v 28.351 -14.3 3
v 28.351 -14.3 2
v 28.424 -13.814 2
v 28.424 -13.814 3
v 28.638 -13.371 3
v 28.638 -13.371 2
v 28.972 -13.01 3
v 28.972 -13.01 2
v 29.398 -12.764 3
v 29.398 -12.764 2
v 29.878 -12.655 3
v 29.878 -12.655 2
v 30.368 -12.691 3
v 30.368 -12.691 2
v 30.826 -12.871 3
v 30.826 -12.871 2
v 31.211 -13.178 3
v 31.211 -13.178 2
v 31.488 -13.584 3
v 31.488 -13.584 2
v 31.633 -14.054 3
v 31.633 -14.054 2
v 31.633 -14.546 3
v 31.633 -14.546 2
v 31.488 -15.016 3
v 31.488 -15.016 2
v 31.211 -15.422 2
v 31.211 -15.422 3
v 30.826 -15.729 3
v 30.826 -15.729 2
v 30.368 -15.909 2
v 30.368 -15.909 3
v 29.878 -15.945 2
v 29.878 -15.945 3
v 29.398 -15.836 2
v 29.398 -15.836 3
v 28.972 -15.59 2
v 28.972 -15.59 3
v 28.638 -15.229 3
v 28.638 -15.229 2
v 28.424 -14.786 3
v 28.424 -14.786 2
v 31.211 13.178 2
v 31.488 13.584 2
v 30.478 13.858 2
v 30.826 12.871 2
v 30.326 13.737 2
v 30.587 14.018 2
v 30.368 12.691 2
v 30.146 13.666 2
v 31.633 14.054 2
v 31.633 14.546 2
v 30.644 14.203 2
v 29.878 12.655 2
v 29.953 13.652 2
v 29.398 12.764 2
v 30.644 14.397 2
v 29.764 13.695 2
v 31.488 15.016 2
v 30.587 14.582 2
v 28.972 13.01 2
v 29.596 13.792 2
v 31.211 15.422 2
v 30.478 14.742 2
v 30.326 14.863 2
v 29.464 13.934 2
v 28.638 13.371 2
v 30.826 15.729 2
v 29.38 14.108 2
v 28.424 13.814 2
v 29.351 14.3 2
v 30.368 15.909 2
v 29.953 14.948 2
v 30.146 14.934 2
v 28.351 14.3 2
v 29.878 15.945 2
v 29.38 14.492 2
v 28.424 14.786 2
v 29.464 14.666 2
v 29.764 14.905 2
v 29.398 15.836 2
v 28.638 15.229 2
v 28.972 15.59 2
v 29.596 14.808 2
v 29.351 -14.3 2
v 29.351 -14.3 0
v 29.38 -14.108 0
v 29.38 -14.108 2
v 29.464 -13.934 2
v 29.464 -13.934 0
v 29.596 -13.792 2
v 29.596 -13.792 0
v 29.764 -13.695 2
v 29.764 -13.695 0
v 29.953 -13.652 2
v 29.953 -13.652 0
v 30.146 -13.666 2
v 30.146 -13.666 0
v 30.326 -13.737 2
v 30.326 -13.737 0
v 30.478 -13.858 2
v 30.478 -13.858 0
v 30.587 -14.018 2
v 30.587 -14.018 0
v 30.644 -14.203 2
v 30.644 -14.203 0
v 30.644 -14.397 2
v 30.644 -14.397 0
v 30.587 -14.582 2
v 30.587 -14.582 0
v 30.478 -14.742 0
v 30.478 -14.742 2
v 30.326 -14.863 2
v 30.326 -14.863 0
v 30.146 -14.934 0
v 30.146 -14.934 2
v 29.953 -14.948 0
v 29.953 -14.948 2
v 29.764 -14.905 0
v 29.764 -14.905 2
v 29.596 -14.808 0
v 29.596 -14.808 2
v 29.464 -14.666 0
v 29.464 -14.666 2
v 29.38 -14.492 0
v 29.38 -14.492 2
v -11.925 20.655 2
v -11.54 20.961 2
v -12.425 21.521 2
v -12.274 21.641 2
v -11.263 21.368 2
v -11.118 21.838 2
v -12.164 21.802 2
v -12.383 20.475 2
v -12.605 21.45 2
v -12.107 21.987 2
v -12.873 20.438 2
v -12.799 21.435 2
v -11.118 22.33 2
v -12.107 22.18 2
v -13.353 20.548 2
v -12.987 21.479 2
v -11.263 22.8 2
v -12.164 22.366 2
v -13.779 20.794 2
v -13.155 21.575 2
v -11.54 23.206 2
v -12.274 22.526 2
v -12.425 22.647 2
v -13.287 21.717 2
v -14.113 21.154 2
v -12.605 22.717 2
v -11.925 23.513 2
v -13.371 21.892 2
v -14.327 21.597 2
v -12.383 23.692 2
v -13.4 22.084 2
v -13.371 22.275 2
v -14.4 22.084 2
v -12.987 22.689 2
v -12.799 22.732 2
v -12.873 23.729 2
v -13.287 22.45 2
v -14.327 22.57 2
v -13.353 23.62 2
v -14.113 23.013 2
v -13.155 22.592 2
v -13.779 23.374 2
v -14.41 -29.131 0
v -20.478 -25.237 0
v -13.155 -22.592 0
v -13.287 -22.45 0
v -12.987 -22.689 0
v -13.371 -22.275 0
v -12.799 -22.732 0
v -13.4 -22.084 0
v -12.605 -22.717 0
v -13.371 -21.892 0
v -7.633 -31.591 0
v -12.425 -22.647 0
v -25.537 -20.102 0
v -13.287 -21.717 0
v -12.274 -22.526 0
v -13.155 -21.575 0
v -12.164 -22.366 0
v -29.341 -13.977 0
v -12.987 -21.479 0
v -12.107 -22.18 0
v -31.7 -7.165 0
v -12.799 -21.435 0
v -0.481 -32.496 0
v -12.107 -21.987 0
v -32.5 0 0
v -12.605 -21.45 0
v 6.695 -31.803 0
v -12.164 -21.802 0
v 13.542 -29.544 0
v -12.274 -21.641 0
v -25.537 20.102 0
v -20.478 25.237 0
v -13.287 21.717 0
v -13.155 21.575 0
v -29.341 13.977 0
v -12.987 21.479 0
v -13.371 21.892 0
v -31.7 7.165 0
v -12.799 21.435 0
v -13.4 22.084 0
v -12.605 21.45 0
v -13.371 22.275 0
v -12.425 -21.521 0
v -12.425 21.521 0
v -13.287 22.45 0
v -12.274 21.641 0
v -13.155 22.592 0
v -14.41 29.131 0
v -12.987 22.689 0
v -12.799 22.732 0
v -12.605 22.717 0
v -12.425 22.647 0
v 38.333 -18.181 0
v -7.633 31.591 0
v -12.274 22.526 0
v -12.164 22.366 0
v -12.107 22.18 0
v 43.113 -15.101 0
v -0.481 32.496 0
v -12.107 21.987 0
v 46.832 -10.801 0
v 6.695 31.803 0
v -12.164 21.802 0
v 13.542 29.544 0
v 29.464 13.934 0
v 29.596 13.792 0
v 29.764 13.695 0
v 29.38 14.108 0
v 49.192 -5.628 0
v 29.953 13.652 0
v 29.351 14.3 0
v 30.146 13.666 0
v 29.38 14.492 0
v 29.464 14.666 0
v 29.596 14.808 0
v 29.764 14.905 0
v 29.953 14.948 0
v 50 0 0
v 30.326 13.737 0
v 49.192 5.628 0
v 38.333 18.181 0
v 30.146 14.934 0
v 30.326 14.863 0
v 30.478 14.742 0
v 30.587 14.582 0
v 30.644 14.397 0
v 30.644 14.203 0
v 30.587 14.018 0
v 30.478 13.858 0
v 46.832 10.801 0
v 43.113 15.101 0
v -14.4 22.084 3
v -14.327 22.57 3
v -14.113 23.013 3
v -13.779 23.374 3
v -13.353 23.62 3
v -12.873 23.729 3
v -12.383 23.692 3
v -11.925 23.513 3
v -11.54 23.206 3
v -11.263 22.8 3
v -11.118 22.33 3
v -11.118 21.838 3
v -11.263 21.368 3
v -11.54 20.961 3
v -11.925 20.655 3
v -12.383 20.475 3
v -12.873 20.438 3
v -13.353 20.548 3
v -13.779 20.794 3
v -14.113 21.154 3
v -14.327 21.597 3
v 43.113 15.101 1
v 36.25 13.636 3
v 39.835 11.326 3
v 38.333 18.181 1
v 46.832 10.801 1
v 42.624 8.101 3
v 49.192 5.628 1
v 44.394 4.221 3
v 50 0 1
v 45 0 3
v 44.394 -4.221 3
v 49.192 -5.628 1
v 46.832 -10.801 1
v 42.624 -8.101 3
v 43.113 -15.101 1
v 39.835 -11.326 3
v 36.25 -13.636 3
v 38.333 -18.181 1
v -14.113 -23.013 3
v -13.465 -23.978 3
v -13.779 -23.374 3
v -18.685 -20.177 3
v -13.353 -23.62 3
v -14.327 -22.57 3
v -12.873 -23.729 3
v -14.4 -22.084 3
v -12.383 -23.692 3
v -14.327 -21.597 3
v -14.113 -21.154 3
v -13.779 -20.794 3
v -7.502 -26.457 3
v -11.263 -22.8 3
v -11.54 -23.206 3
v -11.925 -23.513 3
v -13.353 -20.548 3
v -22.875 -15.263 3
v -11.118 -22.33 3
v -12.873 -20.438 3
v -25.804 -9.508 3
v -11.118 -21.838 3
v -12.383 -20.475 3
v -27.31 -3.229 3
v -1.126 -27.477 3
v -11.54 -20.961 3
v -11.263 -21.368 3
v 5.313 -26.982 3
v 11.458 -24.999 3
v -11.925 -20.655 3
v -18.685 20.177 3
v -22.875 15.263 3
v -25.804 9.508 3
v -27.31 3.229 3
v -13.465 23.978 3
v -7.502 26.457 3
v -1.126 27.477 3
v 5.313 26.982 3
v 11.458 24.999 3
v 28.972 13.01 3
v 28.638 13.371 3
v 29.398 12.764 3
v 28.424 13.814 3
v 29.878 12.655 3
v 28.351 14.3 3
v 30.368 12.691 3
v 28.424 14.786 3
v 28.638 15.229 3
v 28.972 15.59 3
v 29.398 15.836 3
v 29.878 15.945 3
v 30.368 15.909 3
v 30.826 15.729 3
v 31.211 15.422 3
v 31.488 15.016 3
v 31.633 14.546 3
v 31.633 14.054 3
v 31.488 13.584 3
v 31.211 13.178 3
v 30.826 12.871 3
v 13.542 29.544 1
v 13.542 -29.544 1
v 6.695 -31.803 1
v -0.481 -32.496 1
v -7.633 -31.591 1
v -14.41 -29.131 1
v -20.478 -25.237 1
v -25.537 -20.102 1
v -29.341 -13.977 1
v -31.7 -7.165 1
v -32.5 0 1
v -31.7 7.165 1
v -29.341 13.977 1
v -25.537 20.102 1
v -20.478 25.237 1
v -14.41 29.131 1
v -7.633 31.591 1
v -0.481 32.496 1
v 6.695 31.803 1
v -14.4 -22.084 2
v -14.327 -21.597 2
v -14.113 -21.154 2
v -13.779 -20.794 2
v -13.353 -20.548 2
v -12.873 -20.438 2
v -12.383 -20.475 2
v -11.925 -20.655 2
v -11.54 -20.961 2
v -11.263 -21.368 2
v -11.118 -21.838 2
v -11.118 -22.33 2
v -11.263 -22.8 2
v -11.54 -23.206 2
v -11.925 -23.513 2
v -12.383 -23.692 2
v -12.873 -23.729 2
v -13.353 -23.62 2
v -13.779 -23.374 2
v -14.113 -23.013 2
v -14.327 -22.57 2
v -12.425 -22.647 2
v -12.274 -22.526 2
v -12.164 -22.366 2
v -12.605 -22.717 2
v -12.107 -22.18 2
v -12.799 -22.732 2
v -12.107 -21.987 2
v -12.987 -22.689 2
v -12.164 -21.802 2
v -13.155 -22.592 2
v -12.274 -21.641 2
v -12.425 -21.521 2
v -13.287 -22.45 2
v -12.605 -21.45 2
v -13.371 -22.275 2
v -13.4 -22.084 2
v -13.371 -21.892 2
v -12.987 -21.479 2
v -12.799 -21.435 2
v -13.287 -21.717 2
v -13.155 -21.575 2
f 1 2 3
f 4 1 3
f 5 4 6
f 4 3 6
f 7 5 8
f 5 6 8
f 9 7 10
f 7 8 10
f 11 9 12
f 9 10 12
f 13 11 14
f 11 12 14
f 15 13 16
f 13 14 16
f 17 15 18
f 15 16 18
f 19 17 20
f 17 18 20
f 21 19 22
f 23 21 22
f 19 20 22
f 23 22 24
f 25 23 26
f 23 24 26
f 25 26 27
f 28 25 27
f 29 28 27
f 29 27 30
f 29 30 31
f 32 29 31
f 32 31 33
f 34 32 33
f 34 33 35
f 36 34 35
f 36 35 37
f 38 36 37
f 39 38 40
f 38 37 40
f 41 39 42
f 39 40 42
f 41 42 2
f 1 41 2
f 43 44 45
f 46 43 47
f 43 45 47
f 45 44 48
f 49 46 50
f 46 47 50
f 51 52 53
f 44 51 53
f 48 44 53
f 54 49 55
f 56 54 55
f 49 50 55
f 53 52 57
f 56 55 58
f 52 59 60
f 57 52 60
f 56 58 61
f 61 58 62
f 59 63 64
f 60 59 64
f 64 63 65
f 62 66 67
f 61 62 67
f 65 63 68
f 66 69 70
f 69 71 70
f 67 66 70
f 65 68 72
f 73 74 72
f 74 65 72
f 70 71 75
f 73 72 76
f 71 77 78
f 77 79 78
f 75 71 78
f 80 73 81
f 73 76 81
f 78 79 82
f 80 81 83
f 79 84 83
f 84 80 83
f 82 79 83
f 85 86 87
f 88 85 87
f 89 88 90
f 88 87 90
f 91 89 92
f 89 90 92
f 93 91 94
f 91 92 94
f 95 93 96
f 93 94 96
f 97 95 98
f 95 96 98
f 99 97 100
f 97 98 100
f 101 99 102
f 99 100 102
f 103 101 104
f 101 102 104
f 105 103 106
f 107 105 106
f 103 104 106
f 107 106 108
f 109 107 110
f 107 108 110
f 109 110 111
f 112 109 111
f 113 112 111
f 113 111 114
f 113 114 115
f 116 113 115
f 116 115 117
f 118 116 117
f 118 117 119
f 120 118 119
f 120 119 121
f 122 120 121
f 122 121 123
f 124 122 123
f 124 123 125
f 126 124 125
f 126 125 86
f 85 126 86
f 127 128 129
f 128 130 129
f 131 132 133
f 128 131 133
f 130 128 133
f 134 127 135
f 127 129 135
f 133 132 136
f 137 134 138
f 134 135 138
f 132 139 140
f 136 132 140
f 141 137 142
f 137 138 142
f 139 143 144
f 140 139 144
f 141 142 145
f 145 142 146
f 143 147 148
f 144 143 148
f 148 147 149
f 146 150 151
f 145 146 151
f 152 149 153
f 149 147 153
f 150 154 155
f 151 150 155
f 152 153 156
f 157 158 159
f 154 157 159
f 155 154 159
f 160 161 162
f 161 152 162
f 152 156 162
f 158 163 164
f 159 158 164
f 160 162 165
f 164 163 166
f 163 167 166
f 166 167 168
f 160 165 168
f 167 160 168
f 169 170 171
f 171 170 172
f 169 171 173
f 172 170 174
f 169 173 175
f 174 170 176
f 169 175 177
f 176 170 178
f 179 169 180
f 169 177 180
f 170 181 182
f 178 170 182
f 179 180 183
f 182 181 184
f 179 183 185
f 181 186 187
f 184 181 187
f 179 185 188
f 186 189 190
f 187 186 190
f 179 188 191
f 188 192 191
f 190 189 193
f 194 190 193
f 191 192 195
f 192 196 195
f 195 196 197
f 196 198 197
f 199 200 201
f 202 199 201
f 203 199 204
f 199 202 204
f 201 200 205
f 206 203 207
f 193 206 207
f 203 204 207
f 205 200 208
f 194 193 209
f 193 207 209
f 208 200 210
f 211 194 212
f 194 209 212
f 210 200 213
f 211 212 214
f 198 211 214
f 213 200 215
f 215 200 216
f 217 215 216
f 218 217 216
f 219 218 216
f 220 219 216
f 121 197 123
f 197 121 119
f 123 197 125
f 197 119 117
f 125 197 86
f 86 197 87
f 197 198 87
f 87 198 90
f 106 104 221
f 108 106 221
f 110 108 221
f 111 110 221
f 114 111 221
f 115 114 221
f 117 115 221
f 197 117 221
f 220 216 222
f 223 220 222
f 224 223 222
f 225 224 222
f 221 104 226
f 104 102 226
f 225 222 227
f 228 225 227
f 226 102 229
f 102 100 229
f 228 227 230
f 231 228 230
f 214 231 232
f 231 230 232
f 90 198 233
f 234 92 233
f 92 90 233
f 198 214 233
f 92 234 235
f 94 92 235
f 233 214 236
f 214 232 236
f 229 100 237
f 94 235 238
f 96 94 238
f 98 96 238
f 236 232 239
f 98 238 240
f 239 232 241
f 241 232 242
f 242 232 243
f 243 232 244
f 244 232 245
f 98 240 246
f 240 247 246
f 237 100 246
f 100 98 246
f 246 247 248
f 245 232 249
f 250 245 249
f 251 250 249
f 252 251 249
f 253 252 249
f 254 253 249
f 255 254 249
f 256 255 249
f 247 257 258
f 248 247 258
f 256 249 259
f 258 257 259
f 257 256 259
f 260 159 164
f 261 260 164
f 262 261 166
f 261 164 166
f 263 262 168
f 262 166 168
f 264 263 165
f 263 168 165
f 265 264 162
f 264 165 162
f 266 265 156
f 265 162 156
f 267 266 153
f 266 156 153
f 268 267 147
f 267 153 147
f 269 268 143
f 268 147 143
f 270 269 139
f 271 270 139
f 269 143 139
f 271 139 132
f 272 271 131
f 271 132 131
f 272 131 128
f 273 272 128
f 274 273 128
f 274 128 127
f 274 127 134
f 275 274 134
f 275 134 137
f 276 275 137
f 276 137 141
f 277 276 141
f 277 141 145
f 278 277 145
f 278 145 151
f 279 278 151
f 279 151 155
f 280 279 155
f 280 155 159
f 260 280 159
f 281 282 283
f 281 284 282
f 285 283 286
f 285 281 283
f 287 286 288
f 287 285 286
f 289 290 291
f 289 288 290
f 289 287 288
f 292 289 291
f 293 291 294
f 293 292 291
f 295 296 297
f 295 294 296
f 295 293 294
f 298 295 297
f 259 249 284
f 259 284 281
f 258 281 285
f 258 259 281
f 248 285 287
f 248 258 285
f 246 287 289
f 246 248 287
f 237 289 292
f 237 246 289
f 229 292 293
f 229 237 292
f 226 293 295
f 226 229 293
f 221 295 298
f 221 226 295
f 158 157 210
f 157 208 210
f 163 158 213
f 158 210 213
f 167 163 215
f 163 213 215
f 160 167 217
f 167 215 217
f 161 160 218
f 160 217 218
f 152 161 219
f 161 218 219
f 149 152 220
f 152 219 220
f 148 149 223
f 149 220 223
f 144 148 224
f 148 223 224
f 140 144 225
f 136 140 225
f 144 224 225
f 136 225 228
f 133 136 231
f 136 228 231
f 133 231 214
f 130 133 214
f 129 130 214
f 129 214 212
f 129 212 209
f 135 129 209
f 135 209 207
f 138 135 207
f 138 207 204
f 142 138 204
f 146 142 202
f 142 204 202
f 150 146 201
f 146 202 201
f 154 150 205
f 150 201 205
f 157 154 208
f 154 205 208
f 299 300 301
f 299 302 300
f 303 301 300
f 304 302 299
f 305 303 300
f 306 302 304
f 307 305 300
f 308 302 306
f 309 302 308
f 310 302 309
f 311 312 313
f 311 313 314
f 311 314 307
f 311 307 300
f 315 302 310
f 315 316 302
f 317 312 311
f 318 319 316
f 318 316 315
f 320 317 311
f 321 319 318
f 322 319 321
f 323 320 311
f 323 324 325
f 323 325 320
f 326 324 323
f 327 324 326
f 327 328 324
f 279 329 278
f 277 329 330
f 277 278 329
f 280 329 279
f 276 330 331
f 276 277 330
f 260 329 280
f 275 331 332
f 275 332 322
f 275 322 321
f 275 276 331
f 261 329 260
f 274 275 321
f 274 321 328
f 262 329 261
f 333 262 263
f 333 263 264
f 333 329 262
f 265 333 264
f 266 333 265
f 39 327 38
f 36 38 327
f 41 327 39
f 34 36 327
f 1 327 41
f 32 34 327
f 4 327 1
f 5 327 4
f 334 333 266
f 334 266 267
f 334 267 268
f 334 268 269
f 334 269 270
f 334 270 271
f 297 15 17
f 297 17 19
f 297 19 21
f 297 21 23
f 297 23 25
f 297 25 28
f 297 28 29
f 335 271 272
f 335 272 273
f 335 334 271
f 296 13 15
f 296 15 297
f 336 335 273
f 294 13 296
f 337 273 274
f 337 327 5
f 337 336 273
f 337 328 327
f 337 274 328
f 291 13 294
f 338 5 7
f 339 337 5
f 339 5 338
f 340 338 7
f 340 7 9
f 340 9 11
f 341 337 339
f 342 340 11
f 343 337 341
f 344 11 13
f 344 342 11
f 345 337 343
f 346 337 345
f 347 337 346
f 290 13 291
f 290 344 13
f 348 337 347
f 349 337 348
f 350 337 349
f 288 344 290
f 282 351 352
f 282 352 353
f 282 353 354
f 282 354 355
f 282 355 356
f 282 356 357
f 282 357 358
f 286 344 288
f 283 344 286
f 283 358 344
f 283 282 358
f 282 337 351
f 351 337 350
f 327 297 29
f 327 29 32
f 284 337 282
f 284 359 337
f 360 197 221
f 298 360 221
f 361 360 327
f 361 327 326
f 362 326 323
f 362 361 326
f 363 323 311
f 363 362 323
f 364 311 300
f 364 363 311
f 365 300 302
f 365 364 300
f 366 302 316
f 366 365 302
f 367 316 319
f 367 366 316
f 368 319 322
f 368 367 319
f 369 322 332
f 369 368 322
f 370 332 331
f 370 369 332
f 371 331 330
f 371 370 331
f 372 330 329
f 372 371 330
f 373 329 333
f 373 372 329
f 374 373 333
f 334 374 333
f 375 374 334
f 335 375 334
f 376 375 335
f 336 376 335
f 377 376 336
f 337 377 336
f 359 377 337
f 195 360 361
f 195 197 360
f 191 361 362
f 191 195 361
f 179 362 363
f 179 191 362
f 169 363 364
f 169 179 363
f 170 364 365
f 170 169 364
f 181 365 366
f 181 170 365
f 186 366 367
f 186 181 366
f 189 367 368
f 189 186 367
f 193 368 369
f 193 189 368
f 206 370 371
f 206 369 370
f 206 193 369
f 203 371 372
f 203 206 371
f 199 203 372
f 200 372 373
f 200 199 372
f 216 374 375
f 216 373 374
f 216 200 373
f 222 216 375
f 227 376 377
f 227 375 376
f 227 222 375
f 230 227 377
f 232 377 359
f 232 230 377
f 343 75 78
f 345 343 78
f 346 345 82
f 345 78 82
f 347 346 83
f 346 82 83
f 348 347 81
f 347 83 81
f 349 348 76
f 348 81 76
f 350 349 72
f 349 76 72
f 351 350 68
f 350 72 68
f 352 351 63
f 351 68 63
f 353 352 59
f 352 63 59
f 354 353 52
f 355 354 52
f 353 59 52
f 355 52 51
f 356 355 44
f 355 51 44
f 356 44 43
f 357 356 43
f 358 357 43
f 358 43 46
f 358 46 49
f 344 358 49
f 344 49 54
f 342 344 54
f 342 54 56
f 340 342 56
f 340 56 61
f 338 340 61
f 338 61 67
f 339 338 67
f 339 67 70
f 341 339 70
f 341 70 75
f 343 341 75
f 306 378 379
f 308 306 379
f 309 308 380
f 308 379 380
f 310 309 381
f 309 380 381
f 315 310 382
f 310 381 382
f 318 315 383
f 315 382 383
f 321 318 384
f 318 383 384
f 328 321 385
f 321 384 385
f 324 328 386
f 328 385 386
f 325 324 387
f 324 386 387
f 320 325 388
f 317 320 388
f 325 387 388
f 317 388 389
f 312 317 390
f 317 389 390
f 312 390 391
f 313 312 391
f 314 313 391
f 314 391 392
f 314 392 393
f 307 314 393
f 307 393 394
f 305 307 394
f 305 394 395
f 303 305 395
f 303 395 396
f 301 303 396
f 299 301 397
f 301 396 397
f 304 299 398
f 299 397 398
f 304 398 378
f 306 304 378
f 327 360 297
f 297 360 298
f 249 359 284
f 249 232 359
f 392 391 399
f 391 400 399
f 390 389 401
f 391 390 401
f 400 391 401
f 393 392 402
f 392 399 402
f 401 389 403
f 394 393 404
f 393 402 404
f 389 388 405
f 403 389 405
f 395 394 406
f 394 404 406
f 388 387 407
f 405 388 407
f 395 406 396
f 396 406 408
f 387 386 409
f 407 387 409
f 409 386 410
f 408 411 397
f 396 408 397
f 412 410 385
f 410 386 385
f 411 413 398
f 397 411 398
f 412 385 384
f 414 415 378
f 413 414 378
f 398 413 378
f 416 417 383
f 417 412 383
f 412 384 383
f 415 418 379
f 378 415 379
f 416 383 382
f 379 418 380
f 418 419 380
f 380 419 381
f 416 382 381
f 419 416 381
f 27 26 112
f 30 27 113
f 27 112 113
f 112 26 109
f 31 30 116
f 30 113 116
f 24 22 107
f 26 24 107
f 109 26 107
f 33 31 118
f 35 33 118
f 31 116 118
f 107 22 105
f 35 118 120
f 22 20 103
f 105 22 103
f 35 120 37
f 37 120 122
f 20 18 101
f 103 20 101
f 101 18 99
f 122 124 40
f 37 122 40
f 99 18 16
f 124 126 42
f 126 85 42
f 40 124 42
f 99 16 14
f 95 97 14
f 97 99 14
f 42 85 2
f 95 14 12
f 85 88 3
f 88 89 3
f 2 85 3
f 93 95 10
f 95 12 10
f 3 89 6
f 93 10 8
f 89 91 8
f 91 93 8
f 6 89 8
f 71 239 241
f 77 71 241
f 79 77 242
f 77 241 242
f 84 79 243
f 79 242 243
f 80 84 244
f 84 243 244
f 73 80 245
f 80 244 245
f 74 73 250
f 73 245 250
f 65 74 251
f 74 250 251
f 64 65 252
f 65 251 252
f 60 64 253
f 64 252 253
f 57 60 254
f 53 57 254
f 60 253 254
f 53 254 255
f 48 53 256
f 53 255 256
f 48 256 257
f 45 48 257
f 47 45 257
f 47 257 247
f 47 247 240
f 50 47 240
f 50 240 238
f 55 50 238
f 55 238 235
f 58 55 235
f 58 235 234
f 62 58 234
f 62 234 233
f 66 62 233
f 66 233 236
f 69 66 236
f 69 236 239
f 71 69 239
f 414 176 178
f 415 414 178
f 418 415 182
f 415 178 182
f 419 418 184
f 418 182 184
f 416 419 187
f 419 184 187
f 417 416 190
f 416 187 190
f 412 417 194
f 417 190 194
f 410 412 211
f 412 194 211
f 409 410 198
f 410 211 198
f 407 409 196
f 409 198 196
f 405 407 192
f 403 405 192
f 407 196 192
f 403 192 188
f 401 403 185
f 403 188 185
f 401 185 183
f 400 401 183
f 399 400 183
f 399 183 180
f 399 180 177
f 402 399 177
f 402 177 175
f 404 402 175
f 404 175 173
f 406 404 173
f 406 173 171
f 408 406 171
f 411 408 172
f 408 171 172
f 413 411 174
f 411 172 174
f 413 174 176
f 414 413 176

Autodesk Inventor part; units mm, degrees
ref_plane "YZ Plane" through (0, 0, 0) normal (1, 0, 0) x (0, 1, 0)
ref_plane "XZ Plane" through (0, 0, 0) normal (0, 1, 0) x (-1, 0, 0)
sketch "Sketch1" plane through (0, 0, 0) normal (0, 0, 1) x (1, 0, 0)
  arc A0 (13.5417, 29.5444) -> (13.5417, -29.5444) centre (0, 0) ccw
  arc A1 (38.3333, -18.1812) -> (38.3333, 18.1812) centre (30, 0) ccw
  line L0 (0, 0) -> (30, 0)
  line L1 (13.5417, 29.5444) -> (38.3333, 18.1812)
  line L2 (13.5417, -29.5444) -> (38.3333, -18.1812)
  dimension "d0" = 65
  dimension "d1" = 40
  dimension "d2" = 30
extrude "Extrusion1" add sketch "Sketch1" along normal blind 3
chamfer "Chamfer1" distance 5 distance2 2 4 edges at (50, 0, 3) (25.9375, 23.8628, 3) (-32.5, 0, 3) (25.9375, -23.8628, 3) measured on face at (-1.7306, 1.2719, 3)
sketch "Sketch2" plane through (0, 0, 0) normal (0, 0, -1) x (-1, 0, 0)
  line L0 (-13.5417, -29.5444) -> (-38.3333, -18.1812) construction
  arc A0 (-13.5417, -29.5444) -> (-13.5417, 29.5444) centre (0, 0) ccw construction
  line L1 (-38.3333, 18.1812) -> (-13.5417, 29.5444) construction
  arc A1 (-38.3333, 18.1812) -> (-38.3333, -18.1812) centre (-30, 0) ccw construction
  arc A2 (-10.625, -23.181) -> (-10.625, 23.181) centre (0, 0) ccw construction
  line L2 (-10.625, -23.181) -> (-35.4167, -11.8178) construction
  arc A3 (-35.4167, 11.8178) -> (-35.4167, -11.8178) centre (-30, 0) ccw construction
  line L3 (-35.4167, 11.8178) -> (-10.625, 23.181) construction
  line L4 (0, 0) -> (12.75, 22.0836) construction
  line L5 (0, 0) -> (12.75, -22.0836) construction
  circle A4 centre (-30.0011, 14.3) radius 0.65
  circle A5 centre (-30.0011, -14.3) radius 0.65
  circle A6 centre (12.75, -22.0836) radius 0.65
  circle A7 centre (12.75, 22.0836) radius 0.65
  line L6 (0, 0) -> (25.5, 0) construction
  dimension "d8" = 7
  dimension "d11" = 1.3
  dimension "d12" = 1.3
  dimension "d13" = 1.3
  dimension "d14" = 1.3
  dimension "d25" = 13
  dimension "d26" = 14.3
  dimension "d27" = 14.3
  dimension "d28" = 120
  dimension "d29" = 60
extrude "Extrusion2" cut sketch "Sketch2" against normal blind 10
ref_plane "Work Plane1" through (0, 0, 2) normal (0, 0, -1) x (-1, 0, 0)
sketch "Sketch3" plane through (0, 0, 2) normal (0, 0, -1) x (-1, 0, 0)
  circle A0 centre (12.75, -22.0836) radius 0.65 projected
  circle A1 centre (-30.0011, -14.3) radius 0.65 projected
  circle A2 centre (12.75, 22.0836) radius 0.65 projected
  circle A3 centre (-30.0011, 14.3) radius 0.65 projected
  line L0 (-13.5417, -29.5444) -> (-38.3333, -18.1812) projected
  arc A4 (-13.5417, -29.5444) -> (-13.5417, 29.5444) centre (0, 0) ccw projected
  line L1 (-38.3333, 18.1812) -> (-13.5417, 29.5444) projected
  arc A5 (-38.3333, 18.1812) -> (-38.3333, -18.1812) centre (-30, 0) ccw projected
  circle A6 centre (-30.0011, 14.3) radius 1.65
  circle A7 centre (-30.0011, -14.3) radius 1.65
  circle A8 centre (12.75, -22.0836) radius 1.65
  circle A9 centre (12.75, 22.0836) radius 1.65
  dimension "d18" = 3.3
  dimension "d19" = 3.3
  dimension "d20" = 3.3
  dimension "d21" = 3.3
extrude "Extrusion3" cut sketch "Sketch3" against normal blind 10 contours A0 | A1 | A2 | A3 | A6 | A7 | A8 | A9
properties part number "Wirst_2R_cover"
